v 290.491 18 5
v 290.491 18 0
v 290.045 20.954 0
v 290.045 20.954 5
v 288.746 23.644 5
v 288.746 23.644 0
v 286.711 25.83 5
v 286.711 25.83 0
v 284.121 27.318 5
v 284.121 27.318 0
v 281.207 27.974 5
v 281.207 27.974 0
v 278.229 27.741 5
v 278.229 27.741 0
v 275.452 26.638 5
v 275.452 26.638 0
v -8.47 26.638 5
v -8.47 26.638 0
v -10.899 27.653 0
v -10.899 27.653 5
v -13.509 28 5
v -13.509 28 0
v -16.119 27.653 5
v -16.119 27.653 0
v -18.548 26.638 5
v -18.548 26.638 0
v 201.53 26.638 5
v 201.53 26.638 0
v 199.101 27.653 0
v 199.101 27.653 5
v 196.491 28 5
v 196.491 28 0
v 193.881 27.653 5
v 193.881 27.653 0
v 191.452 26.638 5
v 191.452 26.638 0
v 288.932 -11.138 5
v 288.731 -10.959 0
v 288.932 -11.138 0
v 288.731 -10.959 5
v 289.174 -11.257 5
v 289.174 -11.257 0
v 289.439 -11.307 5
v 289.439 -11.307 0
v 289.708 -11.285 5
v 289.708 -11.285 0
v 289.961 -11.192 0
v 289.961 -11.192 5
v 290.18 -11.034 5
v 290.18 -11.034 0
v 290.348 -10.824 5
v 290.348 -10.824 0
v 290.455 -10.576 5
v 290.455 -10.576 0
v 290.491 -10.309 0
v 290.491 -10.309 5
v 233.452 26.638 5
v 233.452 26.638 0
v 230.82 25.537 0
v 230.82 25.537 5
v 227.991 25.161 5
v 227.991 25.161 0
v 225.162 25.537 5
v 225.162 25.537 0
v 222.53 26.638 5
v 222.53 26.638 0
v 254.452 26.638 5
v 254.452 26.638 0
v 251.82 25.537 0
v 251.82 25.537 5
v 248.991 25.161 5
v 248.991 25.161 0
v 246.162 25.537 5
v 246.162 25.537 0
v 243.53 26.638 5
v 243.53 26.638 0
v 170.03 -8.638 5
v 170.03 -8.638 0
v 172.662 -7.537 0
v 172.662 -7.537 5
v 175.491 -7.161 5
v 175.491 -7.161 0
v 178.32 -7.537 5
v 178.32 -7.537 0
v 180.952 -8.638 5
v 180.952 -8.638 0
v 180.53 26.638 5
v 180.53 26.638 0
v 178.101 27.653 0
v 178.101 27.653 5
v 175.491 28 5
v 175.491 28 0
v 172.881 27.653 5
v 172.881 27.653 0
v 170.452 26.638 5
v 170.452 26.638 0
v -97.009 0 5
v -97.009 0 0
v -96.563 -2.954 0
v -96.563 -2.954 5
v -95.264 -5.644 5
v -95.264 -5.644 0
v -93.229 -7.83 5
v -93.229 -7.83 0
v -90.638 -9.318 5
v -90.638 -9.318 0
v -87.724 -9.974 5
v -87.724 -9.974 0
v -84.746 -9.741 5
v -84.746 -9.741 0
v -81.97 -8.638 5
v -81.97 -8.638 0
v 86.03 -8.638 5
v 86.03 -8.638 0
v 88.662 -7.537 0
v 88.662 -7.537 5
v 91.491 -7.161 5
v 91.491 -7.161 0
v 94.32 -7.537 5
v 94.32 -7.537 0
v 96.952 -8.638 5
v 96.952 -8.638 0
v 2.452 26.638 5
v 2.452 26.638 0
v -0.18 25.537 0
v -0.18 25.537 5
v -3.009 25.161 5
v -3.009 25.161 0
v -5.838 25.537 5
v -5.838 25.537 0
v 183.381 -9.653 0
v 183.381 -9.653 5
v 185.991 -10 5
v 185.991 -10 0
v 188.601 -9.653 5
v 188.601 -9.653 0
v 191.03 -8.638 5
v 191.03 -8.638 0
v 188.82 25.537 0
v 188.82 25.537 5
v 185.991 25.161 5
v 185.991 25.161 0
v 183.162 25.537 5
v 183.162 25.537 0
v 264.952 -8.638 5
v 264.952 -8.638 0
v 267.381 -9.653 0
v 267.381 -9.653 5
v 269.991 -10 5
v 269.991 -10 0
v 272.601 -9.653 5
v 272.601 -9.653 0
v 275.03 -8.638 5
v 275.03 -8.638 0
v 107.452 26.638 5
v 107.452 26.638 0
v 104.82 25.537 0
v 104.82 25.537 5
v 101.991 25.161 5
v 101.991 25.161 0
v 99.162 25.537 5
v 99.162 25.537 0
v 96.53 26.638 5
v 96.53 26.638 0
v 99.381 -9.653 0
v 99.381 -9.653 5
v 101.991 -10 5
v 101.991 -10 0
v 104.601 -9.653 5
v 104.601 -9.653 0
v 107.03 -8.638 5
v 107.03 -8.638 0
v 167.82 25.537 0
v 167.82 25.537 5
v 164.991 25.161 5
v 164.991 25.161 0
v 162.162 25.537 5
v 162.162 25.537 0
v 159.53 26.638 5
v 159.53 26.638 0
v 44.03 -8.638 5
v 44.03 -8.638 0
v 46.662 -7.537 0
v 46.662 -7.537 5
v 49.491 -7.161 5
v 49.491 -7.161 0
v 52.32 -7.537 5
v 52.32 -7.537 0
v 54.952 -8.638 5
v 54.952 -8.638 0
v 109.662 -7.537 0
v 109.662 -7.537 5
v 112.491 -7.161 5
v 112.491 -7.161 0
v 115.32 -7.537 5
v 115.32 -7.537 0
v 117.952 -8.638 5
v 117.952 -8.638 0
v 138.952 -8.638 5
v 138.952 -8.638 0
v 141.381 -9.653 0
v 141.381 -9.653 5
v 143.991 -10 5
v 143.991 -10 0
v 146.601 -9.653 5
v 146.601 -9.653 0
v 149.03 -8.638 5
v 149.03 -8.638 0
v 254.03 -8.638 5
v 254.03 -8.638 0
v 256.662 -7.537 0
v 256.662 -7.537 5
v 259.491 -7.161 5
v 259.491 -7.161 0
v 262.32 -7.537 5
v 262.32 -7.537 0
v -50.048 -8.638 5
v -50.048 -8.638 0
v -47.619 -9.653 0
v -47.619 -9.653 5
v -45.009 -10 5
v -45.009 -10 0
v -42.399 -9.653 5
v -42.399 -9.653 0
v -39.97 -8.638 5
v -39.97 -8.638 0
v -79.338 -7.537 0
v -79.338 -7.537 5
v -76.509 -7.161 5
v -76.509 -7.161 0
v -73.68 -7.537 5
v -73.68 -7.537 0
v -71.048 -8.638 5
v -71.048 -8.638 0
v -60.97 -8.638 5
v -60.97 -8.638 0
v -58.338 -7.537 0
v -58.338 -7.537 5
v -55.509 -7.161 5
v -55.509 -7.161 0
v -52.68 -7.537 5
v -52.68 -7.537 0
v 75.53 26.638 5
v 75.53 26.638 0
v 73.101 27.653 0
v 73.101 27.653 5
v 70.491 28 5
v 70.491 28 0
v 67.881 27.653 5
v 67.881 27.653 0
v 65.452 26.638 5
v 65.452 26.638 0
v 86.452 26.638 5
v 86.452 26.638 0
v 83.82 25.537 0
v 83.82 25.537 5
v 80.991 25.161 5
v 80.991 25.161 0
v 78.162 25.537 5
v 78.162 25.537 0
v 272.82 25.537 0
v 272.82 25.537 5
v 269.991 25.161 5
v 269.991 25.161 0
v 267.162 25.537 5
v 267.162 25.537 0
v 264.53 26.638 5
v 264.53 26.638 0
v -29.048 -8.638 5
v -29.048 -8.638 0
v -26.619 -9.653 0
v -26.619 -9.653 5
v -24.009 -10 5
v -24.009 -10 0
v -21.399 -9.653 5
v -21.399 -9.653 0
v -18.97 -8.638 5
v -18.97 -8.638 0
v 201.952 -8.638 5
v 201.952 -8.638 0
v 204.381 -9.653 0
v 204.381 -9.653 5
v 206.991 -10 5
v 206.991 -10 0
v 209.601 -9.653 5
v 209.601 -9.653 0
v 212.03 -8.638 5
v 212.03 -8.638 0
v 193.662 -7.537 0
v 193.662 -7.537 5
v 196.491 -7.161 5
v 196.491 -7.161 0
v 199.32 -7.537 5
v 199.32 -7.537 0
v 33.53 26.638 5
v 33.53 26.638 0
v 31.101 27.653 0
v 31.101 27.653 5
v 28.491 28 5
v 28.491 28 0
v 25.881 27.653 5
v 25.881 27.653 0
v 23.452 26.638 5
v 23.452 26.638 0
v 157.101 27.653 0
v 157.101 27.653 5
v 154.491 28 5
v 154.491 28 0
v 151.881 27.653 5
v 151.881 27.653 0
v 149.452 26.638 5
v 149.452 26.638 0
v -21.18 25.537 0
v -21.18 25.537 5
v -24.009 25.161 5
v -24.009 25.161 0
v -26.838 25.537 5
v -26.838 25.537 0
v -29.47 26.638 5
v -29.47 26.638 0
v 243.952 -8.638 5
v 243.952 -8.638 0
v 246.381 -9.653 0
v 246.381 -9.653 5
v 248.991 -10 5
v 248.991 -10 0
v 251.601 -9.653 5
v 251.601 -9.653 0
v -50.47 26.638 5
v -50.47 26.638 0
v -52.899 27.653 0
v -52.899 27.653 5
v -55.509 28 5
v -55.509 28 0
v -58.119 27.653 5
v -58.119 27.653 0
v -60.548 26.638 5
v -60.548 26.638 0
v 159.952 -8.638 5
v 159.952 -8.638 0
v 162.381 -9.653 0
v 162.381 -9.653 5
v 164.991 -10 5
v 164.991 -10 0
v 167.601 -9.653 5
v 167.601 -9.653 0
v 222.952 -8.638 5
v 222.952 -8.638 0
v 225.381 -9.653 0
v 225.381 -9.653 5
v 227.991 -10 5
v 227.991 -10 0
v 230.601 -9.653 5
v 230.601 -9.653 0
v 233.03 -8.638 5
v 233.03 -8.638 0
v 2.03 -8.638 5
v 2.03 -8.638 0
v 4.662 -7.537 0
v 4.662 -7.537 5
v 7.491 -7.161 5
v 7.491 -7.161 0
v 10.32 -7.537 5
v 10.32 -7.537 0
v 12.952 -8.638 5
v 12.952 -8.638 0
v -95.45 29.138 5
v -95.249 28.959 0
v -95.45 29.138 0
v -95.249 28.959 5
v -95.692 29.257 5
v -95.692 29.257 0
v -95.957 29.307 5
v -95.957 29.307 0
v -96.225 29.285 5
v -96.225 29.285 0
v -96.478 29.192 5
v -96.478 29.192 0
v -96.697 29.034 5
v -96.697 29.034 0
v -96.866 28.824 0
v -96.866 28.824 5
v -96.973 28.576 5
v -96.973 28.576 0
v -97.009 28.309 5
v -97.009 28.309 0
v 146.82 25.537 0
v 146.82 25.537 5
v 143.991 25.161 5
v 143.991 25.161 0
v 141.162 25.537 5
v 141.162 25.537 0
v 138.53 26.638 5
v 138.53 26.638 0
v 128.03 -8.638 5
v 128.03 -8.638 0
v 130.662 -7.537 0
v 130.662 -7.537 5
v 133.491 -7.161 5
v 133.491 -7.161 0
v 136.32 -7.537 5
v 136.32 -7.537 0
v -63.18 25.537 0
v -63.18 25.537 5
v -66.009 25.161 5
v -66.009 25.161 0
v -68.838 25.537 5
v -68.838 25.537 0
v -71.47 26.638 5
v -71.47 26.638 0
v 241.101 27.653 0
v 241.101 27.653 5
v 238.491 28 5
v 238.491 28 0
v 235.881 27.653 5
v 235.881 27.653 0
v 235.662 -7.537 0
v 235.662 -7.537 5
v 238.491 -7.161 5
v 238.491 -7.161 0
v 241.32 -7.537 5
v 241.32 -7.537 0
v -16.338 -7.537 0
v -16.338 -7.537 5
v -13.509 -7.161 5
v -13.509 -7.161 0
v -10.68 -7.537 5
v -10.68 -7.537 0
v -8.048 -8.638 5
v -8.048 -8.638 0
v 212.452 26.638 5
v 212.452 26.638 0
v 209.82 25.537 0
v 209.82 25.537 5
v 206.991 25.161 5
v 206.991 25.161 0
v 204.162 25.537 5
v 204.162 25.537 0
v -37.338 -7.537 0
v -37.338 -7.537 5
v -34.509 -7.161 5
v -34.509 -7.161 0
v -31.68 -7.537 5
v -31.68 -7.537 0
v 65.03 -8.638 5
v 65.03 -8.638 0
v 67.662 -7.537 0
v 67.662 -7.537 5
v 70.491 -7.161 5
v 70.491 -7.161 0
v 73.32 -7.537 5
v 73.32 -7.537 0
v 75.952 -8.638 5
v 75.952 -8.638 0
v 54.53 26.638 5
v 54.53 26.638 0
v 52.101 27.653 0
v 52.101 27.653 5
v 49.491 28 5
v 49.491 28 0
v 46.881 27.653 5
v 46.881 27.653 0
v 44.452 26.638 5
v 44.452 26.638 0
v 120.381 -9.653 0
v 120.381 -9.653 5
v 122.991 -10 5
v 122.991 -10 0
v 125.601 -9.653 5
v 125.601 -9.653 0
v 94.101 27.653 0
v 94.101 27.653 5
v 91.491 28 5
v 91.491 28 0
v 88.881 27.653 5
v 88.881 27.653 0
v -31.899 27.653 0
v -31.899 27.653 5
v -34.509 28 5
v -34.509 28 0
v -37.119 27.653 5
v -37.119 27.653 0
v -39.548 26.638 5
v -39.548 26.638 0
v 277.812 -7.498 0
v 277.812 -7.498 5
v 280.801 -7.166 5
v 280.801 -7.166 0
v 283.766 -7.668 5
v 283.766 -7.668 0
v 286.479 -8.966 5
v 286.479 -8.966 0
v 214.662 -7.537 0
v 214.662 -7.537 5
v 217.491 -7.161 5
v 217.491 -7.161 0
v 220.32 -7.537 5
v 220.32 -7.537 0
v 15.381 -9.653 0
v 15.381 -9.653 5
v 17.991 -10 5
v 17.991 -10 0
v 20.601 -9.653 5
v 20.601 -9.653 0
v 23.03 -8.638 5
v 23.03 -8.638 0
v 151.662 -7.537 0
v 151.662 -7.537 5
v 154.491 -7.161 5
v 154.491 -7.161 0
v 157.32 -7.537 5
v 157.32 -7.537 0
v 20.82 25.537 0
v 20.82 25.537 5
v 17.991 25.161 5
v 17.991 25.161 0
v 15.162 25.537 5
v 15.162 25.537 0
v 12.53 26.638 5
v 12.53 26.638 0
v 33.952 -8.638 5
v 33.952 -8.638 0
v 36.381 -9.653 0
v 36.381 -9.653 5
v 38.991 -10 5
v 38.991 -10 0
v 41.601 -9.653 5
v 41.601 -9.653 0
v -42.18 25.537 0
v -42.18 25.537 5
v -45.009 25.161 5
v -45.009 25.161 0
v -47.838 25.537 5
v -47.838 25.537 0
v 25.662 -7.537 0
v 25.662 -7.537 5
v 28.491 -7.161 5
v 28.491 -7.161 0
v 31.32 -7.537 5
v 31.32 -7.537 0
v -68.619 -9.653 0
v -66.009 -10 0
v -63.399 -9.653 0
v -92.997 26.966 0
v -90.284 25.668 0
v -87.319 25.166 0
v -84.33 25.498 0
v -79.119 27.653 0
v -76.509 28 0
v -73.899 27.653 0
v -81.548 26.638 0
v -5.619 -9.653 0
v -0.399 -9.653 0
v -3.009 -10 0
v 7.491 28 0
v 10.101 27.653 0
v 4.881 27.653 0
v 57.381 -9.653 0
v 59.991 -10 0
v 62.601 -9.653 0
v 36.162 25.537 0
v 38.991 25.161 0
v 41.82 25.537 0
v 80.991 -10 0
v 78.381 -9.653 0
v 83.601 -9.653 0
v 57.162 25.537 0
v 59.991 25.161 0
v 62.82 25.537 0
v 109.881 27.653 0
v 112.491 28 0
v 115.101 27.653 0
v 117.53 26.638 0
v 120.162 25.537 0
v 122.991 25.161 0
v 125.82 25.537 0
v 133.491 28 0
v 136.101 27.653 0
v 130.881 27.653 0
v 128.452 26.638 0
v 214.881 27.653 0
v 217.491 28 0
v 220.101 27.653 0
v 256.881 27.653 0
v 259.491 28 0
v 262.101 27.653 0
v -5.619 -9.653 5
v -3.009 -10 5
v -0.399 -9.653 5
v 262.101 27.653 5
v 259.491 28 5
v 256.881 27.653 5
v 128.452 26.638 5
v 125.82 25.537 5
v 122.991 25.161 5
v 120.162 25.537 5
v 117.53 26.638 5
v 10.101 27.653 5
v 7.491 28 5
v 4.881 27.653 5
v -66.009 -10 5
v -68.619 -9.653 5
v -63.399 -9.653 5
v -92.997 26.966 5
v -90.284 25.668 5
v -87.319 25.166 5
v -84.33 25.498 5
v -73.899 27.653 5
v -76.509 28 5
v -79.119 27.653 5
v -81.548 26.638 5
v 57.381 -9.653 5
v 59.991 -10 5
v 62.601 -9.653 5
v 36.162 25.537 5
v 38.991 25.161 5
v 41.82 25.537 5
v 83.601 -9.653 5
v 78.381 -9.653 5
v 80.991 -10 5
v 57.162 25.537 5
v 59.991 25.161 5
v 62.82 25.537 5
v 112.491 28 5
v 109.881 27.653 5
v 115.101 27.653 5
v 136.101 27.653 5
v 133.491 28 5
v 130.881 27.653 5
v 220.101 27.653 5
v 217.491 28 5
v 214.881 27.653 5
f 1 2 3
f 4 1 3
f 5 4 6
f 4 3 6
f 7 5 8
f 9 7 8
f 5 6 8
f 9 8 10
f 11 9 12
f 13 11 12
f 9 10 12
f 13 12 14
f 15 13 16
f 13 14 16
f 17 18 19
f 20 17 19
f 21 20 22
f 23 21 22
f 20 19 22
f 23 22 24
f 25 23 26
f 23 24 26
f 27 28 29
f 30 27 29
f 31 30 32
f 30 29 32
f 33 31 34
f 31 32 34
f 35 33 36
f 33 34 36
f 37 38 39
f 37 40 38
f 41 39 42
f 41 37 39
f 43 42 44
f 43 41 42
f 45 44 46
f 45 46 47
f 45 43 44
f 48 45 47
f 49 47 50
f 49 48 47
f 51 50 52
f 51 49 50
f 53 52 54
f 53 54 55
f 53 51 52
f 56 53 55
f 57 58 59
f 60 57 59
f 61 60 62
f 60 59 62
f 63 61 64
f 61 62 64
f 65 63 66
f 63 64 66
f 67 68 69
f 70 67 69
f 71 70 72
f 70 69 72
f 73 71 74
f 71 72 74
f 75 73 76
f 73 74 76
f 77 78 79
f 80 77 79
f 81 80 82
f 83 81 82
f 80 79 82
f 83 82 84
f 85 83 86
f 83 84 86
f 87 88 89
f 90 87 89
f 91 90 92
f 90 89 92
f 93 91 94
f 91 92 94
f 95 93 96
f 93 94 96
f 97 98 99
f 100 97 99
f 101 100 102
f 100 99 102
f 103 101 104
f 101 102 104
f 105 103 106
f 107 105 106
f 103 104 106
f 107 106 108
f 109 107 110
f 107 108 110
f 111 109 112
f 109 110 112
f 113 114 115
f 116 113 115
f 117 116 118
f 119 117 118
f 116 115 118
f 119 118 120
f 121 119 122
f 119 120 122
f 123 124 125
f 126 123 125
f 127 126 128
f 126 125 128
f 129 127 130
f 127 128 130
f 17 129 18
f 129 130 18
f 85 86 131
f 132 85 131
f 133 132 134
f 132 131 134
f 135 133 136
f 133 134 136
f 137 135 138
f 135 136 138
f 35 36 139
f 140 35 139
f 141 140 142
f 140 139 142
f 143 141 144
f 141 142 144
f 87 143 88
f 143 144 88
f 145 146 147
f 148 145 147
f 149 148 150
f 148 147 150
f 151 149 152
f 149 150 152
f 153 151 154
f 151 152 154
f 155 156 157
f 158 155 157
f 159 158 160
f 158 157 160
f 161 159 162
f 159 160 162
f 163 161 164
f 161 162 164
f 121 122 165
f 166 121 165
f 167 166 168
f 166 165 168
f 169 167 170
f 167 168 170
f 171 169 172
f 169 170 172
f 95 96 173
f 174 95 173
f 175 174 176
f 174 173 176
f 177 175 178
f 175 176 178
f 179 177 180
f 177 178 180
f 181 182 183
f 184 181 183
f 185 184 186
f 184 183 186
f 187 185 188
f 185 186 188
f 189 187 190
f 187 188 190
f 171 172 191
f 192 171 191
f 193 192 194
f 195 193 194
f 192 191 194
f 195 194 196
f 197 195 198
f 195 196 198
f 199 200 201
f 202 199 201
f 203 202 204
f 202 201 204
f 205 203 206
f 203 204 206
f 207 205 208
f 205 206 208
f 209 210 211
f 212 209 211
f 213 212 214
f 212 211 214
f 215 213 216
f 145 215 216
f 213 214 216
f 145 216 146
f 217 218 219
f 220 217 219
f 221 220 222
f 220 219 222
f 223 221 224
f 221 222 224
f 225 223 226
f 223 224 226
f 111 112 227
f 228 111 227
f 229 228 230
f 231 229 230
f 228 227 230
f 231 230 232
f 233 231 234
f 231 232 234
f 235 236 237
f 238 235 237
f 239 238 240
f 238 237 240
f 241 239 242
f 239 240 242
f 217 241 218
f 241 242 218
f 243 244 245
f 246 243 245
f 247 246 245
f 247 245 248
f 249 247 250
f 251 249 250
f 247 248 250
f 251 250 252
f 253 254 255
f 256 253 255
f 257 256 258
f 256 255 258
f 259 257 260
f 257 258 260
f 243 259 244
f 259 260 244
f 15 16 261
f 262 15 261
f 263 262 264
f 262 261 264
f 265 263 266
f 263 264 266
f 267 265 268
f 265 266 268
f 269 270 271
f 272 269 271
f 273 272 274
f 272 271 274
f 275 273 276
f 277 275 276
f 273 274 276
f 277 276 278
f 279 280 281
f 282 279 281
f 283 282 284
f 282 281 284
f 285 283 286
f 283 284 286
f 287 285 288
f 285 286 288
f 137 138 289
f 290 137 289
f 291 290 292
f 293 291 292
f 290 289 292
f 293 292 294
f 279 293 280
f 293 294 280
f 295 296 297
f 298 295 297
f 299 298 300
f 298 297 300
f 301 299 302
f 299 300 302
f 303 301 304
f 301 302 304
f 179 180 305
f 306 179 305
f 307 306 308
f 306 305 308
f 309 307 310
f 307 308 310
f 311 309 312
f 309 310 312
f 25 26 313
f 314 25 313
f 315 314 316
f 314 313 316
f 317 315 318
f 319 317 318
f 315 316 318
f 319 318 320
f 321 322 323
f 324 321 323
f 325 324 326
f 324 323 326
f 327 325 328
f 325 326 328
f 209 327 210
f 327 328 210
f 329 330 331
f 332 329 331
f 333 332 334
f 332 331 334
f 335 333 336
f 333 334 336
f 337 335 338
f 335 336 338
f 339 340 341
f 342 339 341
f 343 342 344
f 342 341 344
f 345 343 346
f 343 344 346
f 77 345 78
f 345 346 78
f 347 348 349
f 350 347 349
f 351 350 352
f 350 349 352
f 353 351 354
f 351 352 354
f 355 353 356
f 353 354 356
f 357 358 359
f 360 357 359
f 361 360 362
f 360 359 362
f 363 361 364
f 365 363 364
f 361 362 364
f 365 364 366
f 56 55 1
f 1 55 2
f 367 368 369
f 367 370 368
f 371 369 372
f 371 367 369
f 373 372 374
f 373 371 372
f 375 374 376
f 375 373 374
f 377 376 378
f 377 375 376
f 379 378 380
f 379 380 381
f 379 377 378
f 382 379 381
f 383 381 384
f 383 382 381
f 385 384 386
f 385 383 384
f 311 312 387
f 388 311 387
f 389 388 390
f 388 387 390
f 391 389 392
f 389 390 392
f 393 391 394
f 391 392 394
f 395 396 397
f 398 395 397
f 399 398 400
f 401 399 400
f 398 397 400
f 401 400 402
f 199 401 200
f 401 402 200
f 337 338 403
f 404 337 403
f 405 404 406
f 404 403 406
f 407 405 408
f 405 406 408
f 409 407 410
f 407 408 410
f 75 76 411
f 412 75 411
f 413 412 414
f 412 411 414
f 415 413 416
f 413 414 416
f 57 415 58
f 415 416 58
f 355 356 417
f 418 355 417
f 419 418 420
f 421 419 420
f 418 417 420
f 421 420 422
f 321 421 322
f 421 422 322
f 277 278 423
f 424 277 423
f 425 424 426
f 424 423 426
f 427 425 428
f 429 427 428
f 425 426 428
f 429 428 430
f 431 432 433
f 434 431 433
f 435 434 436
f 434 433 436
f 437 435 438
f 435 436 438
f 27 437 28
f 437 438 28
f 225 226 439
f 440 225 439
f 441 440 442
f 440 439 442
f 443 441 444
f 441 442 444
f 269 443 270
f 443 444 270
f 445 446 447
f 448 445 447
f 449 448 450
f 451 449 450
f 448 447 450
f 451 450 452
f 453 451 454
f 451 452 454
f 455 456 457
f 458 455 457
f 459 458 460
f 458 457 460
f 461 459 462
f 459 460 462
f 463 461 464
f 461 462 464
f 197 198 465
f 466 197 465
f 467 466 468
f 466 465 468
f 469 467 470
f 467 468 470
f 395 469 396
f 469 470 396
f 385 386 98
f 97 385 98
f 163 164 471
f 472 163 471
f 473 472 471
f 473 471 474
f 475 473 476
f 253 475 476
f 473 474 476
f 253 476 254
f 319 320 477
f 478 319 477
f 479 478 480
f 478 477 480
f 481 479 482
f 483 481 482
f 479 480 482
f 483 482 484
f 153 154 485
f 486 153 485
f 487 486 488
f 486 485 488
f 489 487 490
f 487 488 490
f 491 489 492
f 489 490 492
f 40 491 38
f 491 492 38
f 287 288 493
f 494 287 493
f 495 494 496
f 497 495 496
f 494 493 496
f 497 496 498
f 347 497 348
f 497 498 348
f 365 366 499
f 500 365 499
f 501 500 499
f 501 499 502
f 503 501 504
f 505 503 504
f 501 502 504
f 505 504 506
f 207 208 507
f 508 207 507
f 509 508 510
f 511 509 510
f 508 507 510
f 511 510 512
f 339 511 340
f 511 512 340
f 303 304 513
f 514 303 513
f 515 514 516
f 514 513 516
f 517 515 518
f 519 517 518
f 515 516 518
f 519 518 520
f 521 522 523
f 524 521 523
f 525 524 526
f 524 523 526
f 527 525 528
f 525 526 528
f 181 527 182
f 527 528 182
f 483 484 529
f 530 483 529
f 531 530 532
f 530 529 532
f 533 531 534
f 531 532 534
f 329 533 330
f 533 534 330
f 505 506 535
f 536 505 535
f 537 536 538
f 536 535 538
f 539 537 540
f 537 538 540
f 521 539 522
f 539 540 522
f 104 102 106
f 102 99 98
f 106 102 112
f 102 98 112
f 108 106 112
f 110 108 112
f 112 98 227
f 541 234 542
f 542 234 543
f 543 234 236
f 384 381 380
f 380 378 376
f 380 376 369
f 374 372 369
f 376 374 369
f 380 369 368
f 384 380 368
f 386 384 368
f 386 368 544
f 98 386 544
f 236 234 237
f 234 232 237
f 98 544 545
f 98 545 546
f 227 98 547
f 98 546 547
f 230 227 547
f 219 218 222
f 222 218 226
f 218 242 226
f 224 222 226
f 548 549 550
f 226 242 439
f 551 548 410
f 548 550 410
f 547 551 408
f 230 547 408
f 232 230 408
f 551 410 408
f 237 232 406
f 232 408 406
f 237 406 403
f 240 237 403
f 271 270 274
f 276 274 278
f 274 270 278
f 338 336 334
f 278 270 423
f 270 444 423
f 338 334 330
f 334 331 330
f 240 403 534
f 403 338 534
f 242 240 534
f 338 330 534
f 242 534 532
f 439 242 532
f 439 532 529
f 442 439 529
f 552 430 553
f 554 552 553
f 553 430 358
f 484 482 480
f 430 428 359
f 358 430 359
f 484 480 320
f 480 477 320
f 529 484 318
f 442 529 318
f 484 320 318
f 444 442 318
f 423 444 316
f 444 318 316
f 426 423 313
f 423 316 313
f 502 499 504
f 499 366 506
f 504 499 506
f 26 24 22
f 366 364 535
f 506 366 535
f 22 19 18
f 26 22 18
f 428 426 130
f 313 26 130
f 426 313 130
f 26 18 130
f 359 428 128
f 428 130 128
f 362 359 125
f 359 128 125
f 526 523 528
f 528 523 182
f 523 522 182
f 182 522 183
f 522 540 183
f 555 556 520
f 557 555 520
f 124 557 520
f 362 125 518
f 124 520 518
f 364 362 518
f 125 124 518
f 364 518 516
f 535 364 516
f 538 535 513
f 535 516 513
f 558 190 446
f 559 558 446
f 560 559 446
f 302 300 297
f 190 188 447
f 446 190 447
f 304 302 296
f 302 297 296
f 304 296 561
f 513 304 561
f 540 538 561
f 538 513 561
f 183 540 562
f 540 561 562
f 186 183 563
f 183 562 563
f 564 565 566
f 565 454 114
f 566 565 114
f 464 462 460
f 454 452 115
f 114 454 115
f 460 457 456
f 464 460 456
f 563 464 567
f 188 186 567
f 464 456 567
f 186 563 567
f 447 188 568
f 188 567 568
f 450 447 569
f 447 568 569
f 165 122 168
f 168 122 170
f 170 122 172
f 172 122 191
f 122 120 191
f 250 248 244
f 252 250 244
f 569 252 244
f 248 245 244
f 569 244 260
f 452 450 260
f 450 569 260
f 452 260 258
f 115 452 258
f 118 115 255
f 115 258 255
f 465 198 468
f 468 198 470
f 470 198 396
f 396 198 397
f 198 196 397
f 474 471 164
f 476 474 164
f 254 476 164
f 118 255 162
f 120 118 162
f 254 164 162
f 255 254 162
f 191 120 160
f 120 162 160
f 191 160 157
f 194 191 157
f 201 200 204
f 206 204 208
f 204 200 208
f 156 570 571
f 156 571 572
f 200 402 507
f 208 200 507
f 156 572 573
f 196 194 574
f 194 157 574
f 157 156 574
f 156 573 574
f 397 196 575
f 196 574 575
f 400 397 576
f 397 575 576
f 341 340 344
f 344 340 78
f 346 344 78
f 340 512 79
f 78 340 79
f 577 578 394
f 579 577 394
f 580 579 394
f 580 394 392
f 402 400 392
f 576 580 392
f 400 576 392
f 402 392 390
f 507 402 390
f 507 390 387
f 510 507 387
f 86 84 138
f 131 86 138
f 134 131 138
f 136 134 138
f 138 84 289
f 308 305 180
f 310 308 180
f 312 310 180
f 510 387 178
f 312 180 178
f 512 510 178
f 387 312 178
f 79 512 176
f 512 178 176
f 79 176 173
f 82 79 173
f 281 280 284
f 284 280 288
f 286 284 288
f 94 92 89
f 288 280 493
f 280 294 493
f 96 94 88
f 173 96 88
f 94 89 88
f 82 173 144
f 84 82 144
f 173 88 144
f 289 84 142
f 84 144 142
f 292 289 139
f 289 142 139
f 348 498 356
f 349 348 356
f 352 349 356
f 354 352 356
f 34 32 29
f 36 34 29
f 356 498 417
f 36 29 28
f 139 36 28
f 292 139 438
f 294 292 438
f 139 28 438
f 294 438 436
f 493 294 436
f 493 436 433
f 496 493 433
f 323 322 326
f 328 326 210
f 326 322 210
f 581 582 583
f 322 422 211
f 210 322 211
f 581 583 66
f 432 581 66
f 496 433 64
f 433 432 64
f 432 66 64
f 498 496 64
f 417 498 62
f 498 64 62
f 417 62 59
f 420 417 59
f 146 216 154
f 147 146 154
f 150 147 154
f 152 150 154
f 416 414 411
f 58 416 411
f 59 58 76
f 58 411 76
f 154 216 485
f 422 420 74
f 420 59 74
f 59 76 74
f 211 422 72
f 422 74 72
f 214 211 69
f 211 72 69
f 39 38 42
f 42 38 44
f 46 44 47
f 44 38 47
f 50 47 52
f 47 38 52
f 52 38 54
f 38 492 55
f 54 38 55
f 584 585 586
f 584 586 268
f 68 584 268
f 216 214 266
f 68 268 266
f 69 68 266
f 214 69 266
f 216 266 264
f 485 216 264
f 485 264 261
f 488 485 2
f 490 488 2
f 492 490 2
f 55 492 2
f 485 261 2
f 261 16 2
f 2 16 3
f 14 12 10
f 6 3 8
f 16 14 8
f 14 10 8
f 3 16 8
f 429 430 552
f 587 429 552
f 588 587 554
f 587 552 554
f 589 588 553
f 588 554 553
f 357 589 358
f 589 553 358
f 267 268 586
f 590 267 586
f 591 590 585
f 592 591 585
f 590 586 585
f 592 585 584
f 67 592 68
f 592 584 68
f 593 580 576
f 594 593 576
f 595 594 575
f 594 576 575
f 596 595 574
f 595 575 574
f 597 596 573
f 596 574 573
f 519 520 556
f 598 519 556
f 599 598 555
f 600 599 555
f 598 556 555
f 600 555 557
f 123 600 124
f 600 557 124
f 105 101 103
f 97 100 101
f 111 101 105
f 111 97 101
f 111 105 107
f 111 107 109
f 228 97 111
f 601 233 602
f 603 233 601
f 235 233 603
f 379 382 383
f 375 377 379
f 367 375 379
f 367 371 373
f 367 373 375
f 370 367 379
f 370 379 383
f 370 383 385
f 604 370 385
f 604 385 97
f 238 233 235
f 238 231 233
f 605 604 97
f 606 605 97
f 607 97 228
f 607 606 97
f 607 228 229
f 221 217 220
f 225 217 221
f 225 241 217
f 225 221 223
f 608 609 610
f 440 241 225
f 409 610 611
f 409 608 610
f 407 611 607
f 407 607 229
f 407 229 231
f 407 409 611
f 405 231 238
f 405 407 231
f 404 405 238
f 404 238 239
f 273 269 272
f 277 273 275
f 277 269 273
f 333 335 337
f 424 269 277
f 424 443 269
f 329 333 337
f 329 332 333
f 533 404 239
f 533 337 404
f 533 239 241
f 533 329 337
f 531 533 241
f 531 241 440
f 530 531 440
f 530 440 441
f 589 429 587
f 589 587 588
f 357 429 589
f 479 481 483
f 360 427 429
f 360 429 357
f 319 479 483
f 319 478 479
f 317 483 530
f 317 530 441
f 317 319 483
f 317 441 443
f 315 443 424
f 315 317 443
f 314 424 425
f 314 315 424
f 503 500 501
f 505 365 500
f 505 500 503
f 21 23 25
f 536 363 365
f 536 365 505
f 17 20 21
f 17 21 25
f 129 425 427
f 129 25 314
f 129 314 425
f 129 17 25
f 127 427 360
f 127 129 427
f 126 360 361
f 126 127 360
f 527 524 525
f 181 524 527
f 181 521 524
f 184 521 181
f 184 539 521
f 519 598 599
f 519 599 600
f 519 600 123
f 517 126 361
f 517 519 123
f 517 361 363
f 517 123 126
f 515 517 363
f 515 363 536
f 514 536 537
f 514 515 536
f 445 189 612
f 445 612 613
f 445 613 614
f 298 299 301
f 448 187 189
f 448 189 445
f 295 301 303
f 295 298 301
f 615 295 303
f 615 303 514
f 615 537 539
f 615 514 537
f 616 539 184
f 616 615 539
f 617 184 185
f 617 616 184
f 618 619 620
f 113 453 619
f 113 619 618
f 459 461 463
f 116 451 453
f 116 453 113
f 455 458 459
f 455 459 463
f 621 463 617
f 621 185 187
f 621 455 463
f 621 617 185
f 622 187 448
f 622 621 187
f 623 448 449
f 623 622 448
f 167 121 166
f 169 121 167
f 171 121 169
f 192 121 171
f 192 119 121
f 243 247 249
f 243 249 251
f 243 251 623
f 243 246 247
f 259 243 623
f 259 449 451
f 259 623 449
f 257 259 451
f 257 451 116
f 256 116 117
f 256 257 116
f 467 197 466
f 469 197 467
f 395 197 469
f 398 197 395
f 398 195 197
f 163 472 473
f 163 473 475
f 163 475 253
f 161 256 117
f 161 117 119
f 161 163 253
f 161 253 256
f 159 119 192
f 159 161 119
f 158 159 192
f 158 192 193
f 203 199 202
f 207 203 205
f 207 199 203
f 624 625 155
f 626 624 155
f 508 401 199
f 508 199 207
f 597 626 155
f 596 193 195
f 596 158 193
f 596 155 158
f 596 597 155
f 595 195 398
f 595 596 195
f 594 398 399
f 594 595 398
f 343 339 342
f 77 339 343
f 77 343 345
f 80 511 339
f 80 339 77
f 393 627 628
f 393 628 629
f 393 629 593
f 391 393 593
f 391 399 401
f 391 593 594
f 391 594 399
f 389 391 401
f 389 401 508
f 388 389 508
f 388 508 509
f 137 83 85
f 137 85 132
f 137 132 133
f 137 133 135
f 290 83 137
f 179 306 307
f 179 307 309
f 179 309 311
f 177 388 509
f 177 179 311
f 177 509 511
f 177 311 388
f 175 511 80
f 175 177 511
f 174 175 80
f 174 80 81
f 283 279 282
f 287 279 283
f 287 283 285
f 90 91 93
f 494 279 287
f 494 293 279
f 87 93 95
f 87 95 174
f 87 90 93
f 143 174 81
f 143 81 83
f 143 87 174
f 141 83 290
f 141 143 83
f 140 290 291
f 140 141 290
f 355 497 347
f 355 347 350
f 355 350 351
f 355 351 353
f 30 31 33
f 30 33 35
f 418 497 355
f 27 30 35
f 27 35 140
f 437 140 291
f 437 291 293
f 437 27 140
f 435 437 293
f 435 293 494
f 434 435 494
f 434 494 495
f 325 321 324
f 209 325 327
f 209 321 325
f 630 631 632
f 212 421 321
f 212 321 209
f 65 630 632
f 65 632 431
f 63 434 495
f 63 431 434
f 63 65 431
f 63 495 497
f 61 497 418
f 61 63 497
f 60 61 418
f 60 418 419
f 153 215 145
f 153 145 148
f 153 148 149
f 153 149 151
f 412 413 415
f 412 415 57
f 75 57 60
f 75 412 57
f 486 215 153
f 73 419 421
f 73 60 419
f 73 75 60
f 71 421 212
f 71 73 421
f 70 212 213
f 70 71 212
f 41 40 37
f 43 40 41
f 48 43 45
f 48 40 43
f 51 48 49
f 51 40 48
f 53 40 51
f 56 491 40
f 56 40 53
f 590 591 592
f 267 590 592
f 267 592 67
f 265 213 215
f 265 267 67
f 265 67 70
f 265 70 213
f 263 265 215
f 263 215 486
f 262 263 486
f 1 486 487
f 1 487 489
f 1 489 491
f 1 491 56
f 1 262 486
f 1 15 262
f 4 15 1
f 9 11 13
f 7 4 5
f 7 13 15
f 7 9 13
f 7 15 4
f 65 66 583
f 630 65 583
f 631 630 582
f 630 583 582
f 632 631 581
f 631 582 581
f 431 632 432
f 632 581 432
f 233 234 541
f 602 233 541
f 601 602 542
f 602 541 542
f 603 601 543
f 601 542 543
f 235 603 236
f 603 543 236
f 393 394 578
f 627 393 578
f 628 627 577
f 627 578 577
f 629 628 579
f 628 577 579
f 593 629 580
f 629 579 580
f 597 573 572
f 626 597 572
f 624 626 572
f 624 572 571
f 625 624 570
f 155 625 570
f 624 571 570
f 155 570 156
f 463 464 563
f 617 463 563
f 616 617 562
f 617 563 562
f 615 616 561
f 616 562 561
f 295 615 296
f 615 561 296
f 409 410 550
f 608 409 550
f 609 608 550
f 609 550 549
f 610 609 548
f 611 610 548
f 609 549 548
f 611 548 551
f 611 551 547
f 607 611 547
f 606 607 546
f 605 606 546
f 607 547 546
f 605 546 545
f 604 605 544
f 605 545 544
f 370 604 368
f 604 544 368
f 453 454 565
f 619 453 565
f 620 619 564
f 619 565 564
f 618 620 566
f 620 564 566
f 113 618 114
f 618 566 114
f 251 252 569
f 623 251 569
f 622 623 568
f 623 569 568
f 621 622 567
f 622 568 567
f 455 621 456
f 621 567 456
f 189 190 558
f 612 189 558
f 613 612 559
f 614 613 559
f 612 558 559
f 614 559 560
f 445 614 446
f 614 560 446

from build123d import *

# Parameters (mm, degrees)
F1_DEPTH = 5
F2_R     = 1


with BuildPart() as f1:
    # F0 (on Top) → F1 (new body)
    with BuildSketch(Plane.XY):
        with BuildLine():
            ThreePointArc((-81.970153, -8.637789), (-78.337442, -4.980607), (-77.008863, 0))
            ThreePointArc((-77.008863, 0), (-87.008863, 10), (-97.008863, 0))
            ThreePointArc((-97.008863, 0), (-91.989471, -8.671422), (-81.970153, -8.637789))
        make_face()
        with BuildLine():
            ThreePointArc((-97.008863, 0), (-87.008863, 10), (-77.008863, 0))
            ThreePointArc((-77.008863, 0), (-78.337442, -4.980607), (-81.970153, -8.637789))
            ThreePointArc((-81.970153, -8.637789), (-76.508863, -7.161334), (-71.047574, -8.637789))
            ThreePointArc((-71.047574, -8.637789), (-70.989471, 8.671422), (-56.008863, 0))
            ThreePointArc((-56.008863, 0), (-57.337442, -4.980607), (-60.970153, -8.637789))
            ThreePointArc((-60.970153, -8.637789), (-55.508863, -7.161334), (-50.047574, -8.637789))
            ThreePointArc((-50.047574, -8.637789), (-49.989471, 8.671422), (-35.008863, 0))
            ThreePointArc((-35.008863, 0), (-36.337442, -4.980607), (-39.970153, -8.637789))
            ThreePointArc((-39.970153, -8.637789), (-34.508863, -7.161334), (-29.047574, -8.637789))
            ThreePointArc((-29.047574, -8.637789), (-28.989471, 8.671422), (-14.008863, 0))
            ThreePointArc((-14.008863, 0), (-15.337442, -4.980607), (-18.970153, -8.637789))
            ThreePointArc((-18.970153, -8.637789), (-13.508863, -7.161334), (-8.047574, -8.637789))
            ThreePointArc((-8.047574, -8.637789), (-7.989471, 8.671422), (6.991137, 0))
            ThreePointArc((6.991137, 0), (5.662558, -4.980607), (2.029847, -8.637789))
            ThreePointArc((2.029847, -8.637789), (7.491137, -7.161334), (12.952426, -8.637789))
            ThreePointArc((12.952426, -8.637789), (13.010529, 8.671422), (27.991137, 0))
            ThreePointArc((27.991137, 0), (26.662558, -4.980607), (23.029847, -8.637789))
            ThreePointArc((23.029847, -8.637789), (28.491137, -7.161334), (33.952426, -8.637789))
            ThreePointArc((33.952426, -8.637789), (34.010529, 8.671422), (48.991137, 0))
            ThreePointArc((48.991137, 0), (47.662558, -4.980607), (44.029847, -8.637789))
            ThreePointArc((44.029847, -8.637789), (49.491137, -7.161334), (54.952426, -8.637789))
            ThreePointArc((54.952426, -8.637789), (55.010529, 8.671422), (69.991137, 0))
            ThreePointArc((69.991137, 0), (68.662558, -4.980607), (65.029847, -8.637789))
            ThreePointArc((65.029847, -8.637789), (70.491137, -7.161334), (75.952426, -8.637789))
            ThreePointArc((75.952426, -8.637789), (76.010529, 8.671422), (90.991137, 0))
            ThreePointArc((90.991137, 0), (89.662558, -4.980607), (86.029847, -8.637789))
            ThreePointArc((86.029847, -8.637789), (91.491137, -7.161334), (96.952426, -8.637789))
            ThreePointArc((96.952426, -8.637789), (97.010529, 8.671422), (111.991137, 0))
            ThreePointArc((111.991137, 0), (110.662558, -4.980607), (107.029847, -8.637789))
            ThreePointArc((107.029847, -8.637789), (112.491137, -7.161334), (117.952426, -8.637789))
            ThreePointArc((117.952426, -8.637789), (118.010529, 8.671422), (132.991137, 0))
            ThreePointArc((132.991137, 0), (131.662558, -4.980607), (128.029847, -8.637789))
            ThreePointArc((128.029847, -8.637789), (133.491137, -7.161334), (138.952426, -8.637789))
            ThreePointArc((138.952426, -8.637789), (139.010529, 8.671422), (153.991137, 0))
            ThreePointArc((153.991137, 0), (152.662558, -4.980607), (149.029847, -8.637789))
            ThreePointArc((149.029847, -8.637789), (154.491137, -7.161334), (159.952426, -8.637789))
            ThreePointArc((159.952426, -8.637789), (160.010529, 8.671422), (174.991137, 0))
            ThreePointArc((174.991137, 0), (173.662558, -4.980607), (170.029847, -8.637789))
            ThreePointArc((170.029847, -8.637789), (175.491137, -7.161334), (180.952426, -8.637789))
            ThreePointArc((180.952426, -8.637789), (181.010529, 8.671422), (195.991137, 0))
            ThreePointArc((195.991137, 0), (194.662558, -4.980607), (191.029847, -8.637789))
            ThreePointArc((191.029847, -8.637789), (196.491137, -7.161334), (201.952426, -8.637789))
            ThreePointArc((201.952426, -8.637789), (202.010529, 8.671422), (216.991137, 0))
            ThreePointArc((216.991137, 0), (215.662558, -4.980607), (212.029847, -8.637789))
            ThreePointArc((212.029847, -8.637789), (217.491137, -7.161334), (222.952426, -8.637789))
            ThreePointArc((222.952426, -8.637789), (223.010529, 8.671422), (237.991137, 0))
            ThreePointArc((237.991137, 0), (236.662558, -4.980607), (233.029847, -8.637789))
            ThreePointArc((233.029847, -8.637789), (238.491137, -7.161334), (243.952426, -8.637789))
            ThreePointArc((243.952426, -8.637789), (244.010529, 8.671422), (258.991137, 0))
            ThreePointArc((258.991137, 0), (257.662558, -4.980607), (254.029847, -8.637789))
            ThreePointArc((254.029847, -8.637789), (259.491137, -7.161334), (264.952426, -8.637789))
            ThreePointArc((264.952426, -8.637789), (265.010529, 8.671422), (279.991137, 0))
            ThreePointArc((279.991137, 0), (278.662558, -4.980607), (275.029847, -8.637789))
            ThreePointArc((275.029847, -8.637789), (283.935331, -7.723123), (290.491137, -13.819488))
            Line((290.491137, -13.819488), (290.491137, 18))
            ThreePointArc((290.491137, 18), (275.510529, 9.328578), (275.452426, 26.637789))
            ThreePointArc((275.452426, 26.637789), (269.991137, 25.161334), (264.529847, 26.637789))
            ThreePointArc((264.529847, 26.637789), (268.162558, 22.980607), (269.491137, 18))
            ThreePointArc((269.491137, 18), (254.510529, 9.328578), (254.452426, 26.637789))
            ThreePointArc((254.452426, 26.637789), (248.991137, 25.161334), (243.529847, 26.637789))
            ThreePointArc((243.529847, 26.637789), (247.162558, 22.980607), (248.491137, 18))
            ThreePointArc((248.491137, 18), (233.510529, 9.328578), (233.452426, 26.637789))
            ThreePointArc((233.452426, 26.637789), (227.991137, 25.161334), (222.529847, 26.637789))
            ThreePointArc((222.529847, 26.637789), (226.162558, 22.980607), (227.491137, 18))
            ThreePointArc((227.491137, 18), (212.510529, 9.328578), (212.452426, 26.637789))
            ThreePointArc((212.452426, 26.637789), (206.991137, 25.161334), (201.529847, 26.637789))
            ThreePointArc((201.529847, 26.637789), (205.162558, 22.980607), (206.491137, 18))
            ThreePointArc((206.491137, 18), (191.510529, 9.328578), (191.452426, 26.637789))
            ThreePointArc((191.452426, 26.637789), (185.991137, 25.161334), (180.529847, 26.637789))
            ThreePointArc((180.529847, 26.637789), (184.162558, 22.980607), (185.491137, 18))
            ThreePointArc((185.491137, 18), (170.510529, 9.328578), (170.452426, 26.637789))
            ThreePointArc((170.452426, 26.637789), (164.991137, 25.161334), (159.529847, 26.637789))
            ThreePointArc((159.529847, 26.637789), (163.162558, 22.980607), (164.491137, 18))
            ThreePointArc((164.491137, 18), (149.510529, 9.328578), (149.452426, 26.637789))
            ThreePointArc((149.452426, 26.637789), (143.991137, 25.161334), (138.529847, 26.637789))
            ThreePointArc((138.529847, 26.637789), (142.162558, 22.980607), (143.491137, 18))
            ThreePointArc((143.491137, 18), (128.510529, 9.328578), (128.452426, 26.637789))
            ThreePointArc((128.452426, 26.637789), (122.991137, 25.161334), (117.529847, 26.637789))
            ThreePointArc((117.529847, 26.637789), (121.162558, 22.980607), (122.491137, 18))
            ThreePointArc((122.491137, 18), (107.510529, 9.328578), (107.452426, 26.637789))
            ThreePointArc((107.452426, 26.637789), (101.991137, 25.161334), (96.529847, 26.637789))
            ThreePointArc((96.529847, 26.637789), (100.162558, 22.980607), (101.491137, 18))
            ThreePointArc((101.491137, 18), (86.510529, 9.328578), (86.452426, 26.637789))
            ThreePointArc((86.452426, 26.637789), (80.991137, 25.161334), (75.529847, 26.637789))
            ThreePointArc((75.529847, 26.637789), (79.162558, 22.980607), (80.491137, 18))
            ThreePointArc((80.491137, 18), (65.510529, 9.328578), (65.452426, 26.637789))
            ThreePointArc((65.452426, 26.637789), (59.991137, 25.161334), (54.529847, 26.637789))
            ThreePointArc((54.529847, 26.637789), (58.162558, 22.980607), (59.491137, 18))
            ThreePointArc((59.491137, 18), (44.510529, 9.328578), (44.452426, 26.637789))
            ThreePointArc((44.452426, 26.637789), (38.991137, 25.161334), (33.529847, 26.637789))
            ThreePointArc((33.529847, 26.637789), (37.162558, 22.980607), (38.491137, 18))
            ThreePointArc((38.491137, 18), (23.510529, 9.328578), (23.452426, 26.637789))
            ThreePointArc((23.452426, 26.637789), (17.991137, 25.161334), (12.529847, 26.637789))
            ThreePointArc((12.529847, 26.637789), (16.162558, 22.980607), (17.491137, 18))
            ThreePointArc((17.491137, 18), (2.510529, 9.328578), (2.452426, 26.637789))
            ThreePointArc((2.452426, 26.637789), (-3.008863, 25.161334), (-8.470153, 26.637789))
            ThreePointArc((-8.470153, 26.637789), (-4.837442, 22.980607), (-3.508863, 18))
            ThreePointArc((-3.508863, 18), (-18.489471, 9.328578), (-18.547574, 26.637789))
            ThreePointArc((-18.547574, 26.637789), (-24.008863, 25.161334), (-29.470153, 26.637789))
            ThreePointArc((-29.470153, 26.637789), (-25.837442, 22.980607), (-24.508863, 18))
            ThreePointArc((-24.508863, 18), (-39.489471, 9.328578), (-39.547574, 26.637789))
            ThreePointArc((-39.547574, 26.637789), (-45.008863, 25.161334), (-50.470153, 26.637789))
            ThreePointArc((-50.470153, 26.637789), (-46.837442, 22.980607), (-45.508863, 18))
            ThreePointArc((-45.508863, 18), (-60.489471, 9.328578), (-60.547574, 26.637789))
            ThreePointArc((-60.547574, 26.637789), (-66.008863, 25.161334), (-71.470153, 26.637789))
            ThreePointArc((-71.470153, 26.637789), (-67.837442, 22.980607), (-66.508863, 18))
            ThreePointArc((-66.508863, 18), (-81.489471, 9.328578), (-81.547574, 26.637789))
            ThreePointArc((-81.547574, 26.637789), (-90.453057, 25.723123), (-97.008863, 31.819488))
            Line((-97.008863, 31.819488), (-97.008863, 0))
        make_face()
        with BuildLine():
            ThreePointArc((-56.008863, 0), (-70.989471, 8.671422), (-71.047574, -8.637789))
            ThreePointArc((-71.047574, -8.637789), (-66.008863, -10), (-60.970153, -8.637789))
            ThreePointArc((-60.970153, -8.637789), (-57.337442, -4.980607), (-56.008863, 0))
        make_face()
        with BuildLine():
            ThreePointArc((-71.470153, 26.637789), (-76.508863, 28), (-81.547574, 26.637789))
            ThreePointArc((-81.547574, 26.637789), (-81.489471, 9.328578), (-66.508863, 18))
            ThreePointArc((-66.508863, 18), (-67.837442, 22.980607), (-71.470153, 26.637789))
        make_face()
        with BuildLine():
            ThreePointArc((-35.008863, 0), (-49.989471, 8.671422), (-50.047574, -8.637789))
            ThreePointArc((-50.047574, -8.637789), (-45.008863, -10), (-39.970153, -8.637789))
            ThreePointArc((-39.970153, -8.637789), (-36.337442, -4.980607), (-35.008863, 0))
        make_face()
        with BuildLine():
            ThreePointArc((-50.470153, 26.637789), (-55.508863, 28), (-60.547574, 26.637789))
            ThreePointArc((-60.547574, 26.637789), (-60.489471, 9.328578), (-45.508863, 18))
            ThreePointArc((-45.508863, 18), (-46.837442, 22.980607), (-50.470153, 26.637789))
        make_face()
        with BuildLine():
            ThreePointArc((-14.008863, 0), (-28.989471, 8.671422), (-29.047574, -8.637789))
            ThreePointArc((-29.047574, -8.637789), (-24.008863, -10), (-18.970153, -8.637789))
            ThreePointArc((-18.970153, -8.637789), (-15.337442, -4.980607), (-14.008863, 0))
        make_face()
        with BuildLine():
            ThreePointArc((-29.470153, 26.637789), (-34.508863, 28), (-39.547574, 26.637789))
            ThreePointArc((-39.547574, 26.637789), (-39.489471, 9.328578), (-24.508863, 18))
            ThreePointArc((-24.508863, 18), (-25.837442, 22.980607), (-29.470153, 26.637789))
        make_face()
        with BuildLine():
            ThreePointArc((6.991137, 0), (-7.989471, 8.671422), (-8.047574, -8.637789))
            ThreePointArc((-8.047574, -8.637789), (-3.008863, -10), (2.029847, -8.637789))
            ThreePointArc((2.029847, -8.637789), (5.662558, -4.980607), (6.991137, 0))
        make_face()
        with BuildLine():
            ThreePointArc((-8.470153, 26.637789), (-13.508863, 28), (-18.547574, 26.637789))
            ThreePointArc((-18.547574, 26.637789), (-18.489471, 9.328578), (-3.508863, 18))
            ThreePointArc((-3.508863, 18), (-4.837442, 22.980607), (-8.470153, 26.637789))
        make_face()
        with BuildLine():
            ThreePointArc((27.991137, 0), (13.010529, 8.671422), (12.952426, -8.637789))
            ThreePointArc((12.952426, -8.637789), (17.991137, -10), (23.029847, -8.637789))
            ThreePointArc((23.029847, -8.637789), (26.662558, -4.980607), (27.991137, 0))
        make_face()
        with BuildLine():
            ThreePointArc((12.529847, 26.637789), (7.491137, 28), (2.452426, 26.637789))
            ThreePointArc((2.452426, 26.637789), (2.510529, 9.328578), (17.491137, 18))
            ThreePointArc((17.491137, 18), (16.162558, 22.980607), (12.529847, 26.637789))
        make_face()
        with BuildLine():
            ThreePointArc((48.991137, 0), (34.010529, 8.671422), (33.952426, -8.637789))
            ThreePointArc((33.952426, -8.637789), (38.991137, -10), (44.029847, -8.637789))
            ThreePointArc((44.029847, -8.637789), (47.662558, -4.980607), (48.991137, 0))
        make_face()
        with BuildLine():
            ThreePointArc((33.529847, 26.637789), (28.491137, 28), (23.452426, 26.637789))
            ThreePointArc((23.452426, 26.637789), (23.510529, 9.328578), (38.491137, 18))
            ThreePointArc((38.491137, 18), (37.162558, 22.980607), (33.529847, 26.637789))
        make_face()
        with BuildLine():
            ThreePointArc((69.991137, 0), (55.010529, 8.671422), (54.952426, -8.637789))
            ThreePointArc((54.952426, -8.637789), (59.991137, -10), (65.029847, -8.637789))
            ThreePointArc((65.029847, -8.637789), (68.662558, -4.980607), (69.991137, 0))
        make_face()
        with BuildLine():
            ThreePointArc((54.529847, 26.637789), (49.491137, 28), (44.452426, 26.637789))
            ThreePointArc((44.452426, 26.637789), (44.510529, 9.328578), (59.491137, 18))
            ThreePointArc((59.491137, 18), (58.162558, 22.980607), (54.529847, 26.637789))
        make_face()
        with BuildLine():
            ThreePointArc((90.991137, 0), (76.010529, 8.671422), (75.952426, -8.637789))
            ThreePointArc((75.952426, -8.637789), (80.991137, -10), (86.029847, -8.637789))
            ThreePointArc((86.029847, -8.637789), (89.662558, -4.980607), (90.991137, 0))
        make_face()
        with BuildLine():
            ThreePointArc((75.529847, 26.637789), (70.491137, 28), (65.452426, 26.637789))
            ThreePointArc((65.452426, 26.637789), (65.510529, 9.328578), (80.491137, 18))
            ThreePointArc((80.491137, 18), (79.162558, 22.980607), (75.529847, 26.637789))
        make_face()
        with BuildLine():
            ThreePointArc((111.991137, 0), (97.010529, 8.671422), (96.952426, -8.637789))
            ThreePointArc((96.952426, -8.637789), (101.991137, -10), (107.029847, -8.637789))
            ThreePointArc((107.029847, -8.637789), (110.662558, -4.980607), (111.991137, 0))
        make_face()
        with BuildLine():
            ThreePointArc((96.529847, 26.637789), (91.491137, 28), (86.452426, 26.637789))
            ThreePointArc((86.452426, 26.637789), (86.510529, 9.328578), (101.491137, 18))
            ThreePointArc((101.491137, 18), (100.162558, 22.980607), (96.529847, 26.637789))
        make_face()
        with BuildLine():
            ThreePointArc((132.991137, 0), (118.010529, 8.671422), (117.952426, -8.637789))
            ThreePointArc((117.952426, -8.637789), (122.991137, -10), (128.029847, -8.637789))
            ThreePointArc((128.029847, -8.637789), (131.662558, -4.980607), (132.991137, 0))
        make_face()
        with BuildLine():
            ThreePointArc((117.529847, 26.637789), (112.491137, 28), (107.452426, 26.637789))
            ThreePointArc((107.452426, 26.637789), (107.510529, 9.328578), (122.491137, 18))
            ThreePointArc((122.491137, 18), (121.162558, 22.980607), (117.529847, 26.637789))
        make_face()
        with BuildLine():
            ThreePointArc((153.991137, 0), (139.010529, 8.671422), (138.952426, -8.637789))
            ThreePointArc((138.952426, -8.637789), (143.991137, -10), (149.029847, -8.637789))
            ThreePointArc((149.029847, -8.637789), (152.662558, -4.980607), (153.991137, 0))
        make_face()
        with BuildLine():
            ThreePointArc((138.529847, 26.637789), (133.491137, 28), (128.452426, 26.637789))
            ThreePointArc((128.452426, 26.637789), (128.510529, 9.328578), (143.491137, 18))
            ThreePointArc((143.491137, 18), (142.162558, 22.980607), (138.529847, 26.637789))
        make_face()
        with BuildLine():
            ThreePointArc((174.991137, 0), (160.010529, 8.671422), (159.952426, -8.637789))
            ThreePointArc((159.952426, -8.637789), (164.991137, -10), (170.029847, -8.637789))
            ThreePointArc((170.029847, -8.637789), (173.662558, -4.980607), (174.991137, 0))
        make_face()
        with BuildLine():
            ThreePointArc((159.529847, 26.637789), (154.491137, 28), (149.452426, 26.637789))
            ThreePointArc((149.452426, 26.637789), (149.510529, 9.328578), (164.491137, 18))
            ThreePointArc((164.491137, 18), (163.162558, 22.980607), (159.529847, 26.637789))
        make_face()
        with BuildLine():
            ThreePointArc((195.991137, 0), (181.010529, 8.671422), (180.952426, -8.637789))
            ThreePointArc((180.952426, -8.637789), (185.991137, -10), (191.029847, -8.637789))
            ThreePointArc((191.029847, -8.637789), (194.662558, -4.980607), (195.991137, 0))
        make_face()
        with BuildLine():
            ThreePointArc((180.529847, 26.637789), (175.491137, 28), (170.452426, 26.637789))
            ThreePointArc((170.452426, 26.637789), (170.510529, 9.328578), (185.491137, 18))
            ThreePointArc((185.491137, 18), (184.162558, 22.980607), (180.529847, 26.637789))
        make_face()
        with BuildLine():
            ThreePointArc((216.991137, 0), (202.010529, 8.671422), (201.952426, -8.637789))
            ThreePointArc((201.952426, -8.637789), (206.991137, -10), (212.029847, -8.637789))
            ThreePointArc((212.029847, -8.637789), (215.662558, -4.980607), (216.991137, 0))
        make_face()
        with BuildLine():
            ThreePointArc((201.529847, 26.637789), (196.491137, 28), (191.452426, 26.637789))
            ThreePointArc((191.452426, 26.637789), (191.510529, 9.328578), (206.491137, 18))
            ThreePointArc((206.491137, 18), (205.162558, 22.980607), (201.529847, 26.637789))
        make_face()
        with BuildLine():
            ThreePointArc((237.991137, 0), (223.010529, 8.671422), (222.952426, -8.637789))
            ThreePointArc((222.952426, -8.637789), (227.991137, -10), (233.029847, -8.637789))
            ThreePointArc((233.029847, -8.637789), (236.662558, -4.980607), (237.991137, 0))
        make_face()
        with BuildLine():
            ThreePointArc((222.529847, 26.637789), (217.491137, 28), (212.452426, 26.637789))
            ThreePointArc((212.452426, 26.637789), (212.510529, 9.328578), (227.491137, 18))
            ThreePointArc((227.491137, 18), (226.162558, 22.980607), (222.529847, 26.637789))
        make_face()
        with BuildLine():
            ThreePointArc((258.991137, 0), (244.010529, 8.671422), (243.952426, -8.637789))
            ThreePointArc((243.952426, -8.637789), (248.991137, -10), (254.029847, -8.637789))
            ThreePointArc((254.029847, -8.637789), (257.662558, -4.980607), (258.991137, 0))
        make_face()
        with BuildLine():
            ThreePointArc((243.529847, 26.637789), (238.491137, 28), (233.452426, 26.637789))
            ThreePointArc((233.452426, 26.637789), (233.510529, 9.328578), (248.491137, 18))
            ThreePointArc((248.491137, 18), (247.162558, 22.980607), (243.529847, 26.637789))
        make_face()
        with BuildLine():
            ThreePointArc((279.991137, 0), (265.010529, 8.671422), (264.952426, -8.637789))
            ThreePointArc((264.952426, -8.637789), (269.991137, -10), (275.029847, -8.637789))
            ThreePointArc((275.029847, -8.637789), (278.662558, -4.980607), (279.991137, 0))
        make_face()
        with BuildLine():
            ThreePointArc((264.529847, 26.637789), (259.491137, 28), (254.452426, 26.637789))
            ThreePointArc((254.452426, 26.637789), (254.510529, 9.328578), (269.491137, 18))
            ThreePointArc((269.491137, 18), (268.162558, 22.980607), (264.529847, 26.637789))
        make_face()
        with BuildLine():
            ThreePointArc((290.491137, 18), (285.471744, 26.671422), (275.452426, 26.637789))
            ThreePointArc((275.452426, 26.637789), (275.510529, 9.328578), (290.491137, 18))
        make_face()
    extrude(amount=F1_DEPTH)

    # F2
    f2_edges = [f1.edges().sort_by_distance(p)[0] for p in [
        (290.491137, -13.819488, 2.5),
        (-97.008863, 31.819488, 2.5),
    ]]
    fillet(f2_edges, radius=F2_R)


solid = f1.part
